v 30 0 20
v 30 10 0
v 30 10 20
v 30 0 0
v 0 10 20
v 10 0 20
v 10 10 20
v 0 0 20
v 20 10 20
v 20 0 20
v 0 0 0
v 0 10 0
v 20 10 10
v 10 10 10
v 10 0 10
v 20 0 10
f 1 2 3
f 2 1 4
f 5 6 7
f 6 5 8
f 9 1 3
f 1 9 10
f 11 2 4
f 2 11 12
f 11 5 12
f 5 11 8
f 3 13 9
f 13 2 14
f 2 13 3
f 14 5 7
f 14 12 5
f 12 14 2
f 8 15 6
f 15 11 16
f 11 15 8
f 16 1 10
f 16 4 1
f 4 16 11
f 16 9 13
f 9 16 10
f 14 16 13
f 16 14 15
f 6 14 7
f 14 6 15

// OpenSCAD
difference() {
	cube([30, 10, 20]);
	translate([10, 0, 10])
		cube([10, 10, 10]);
}
